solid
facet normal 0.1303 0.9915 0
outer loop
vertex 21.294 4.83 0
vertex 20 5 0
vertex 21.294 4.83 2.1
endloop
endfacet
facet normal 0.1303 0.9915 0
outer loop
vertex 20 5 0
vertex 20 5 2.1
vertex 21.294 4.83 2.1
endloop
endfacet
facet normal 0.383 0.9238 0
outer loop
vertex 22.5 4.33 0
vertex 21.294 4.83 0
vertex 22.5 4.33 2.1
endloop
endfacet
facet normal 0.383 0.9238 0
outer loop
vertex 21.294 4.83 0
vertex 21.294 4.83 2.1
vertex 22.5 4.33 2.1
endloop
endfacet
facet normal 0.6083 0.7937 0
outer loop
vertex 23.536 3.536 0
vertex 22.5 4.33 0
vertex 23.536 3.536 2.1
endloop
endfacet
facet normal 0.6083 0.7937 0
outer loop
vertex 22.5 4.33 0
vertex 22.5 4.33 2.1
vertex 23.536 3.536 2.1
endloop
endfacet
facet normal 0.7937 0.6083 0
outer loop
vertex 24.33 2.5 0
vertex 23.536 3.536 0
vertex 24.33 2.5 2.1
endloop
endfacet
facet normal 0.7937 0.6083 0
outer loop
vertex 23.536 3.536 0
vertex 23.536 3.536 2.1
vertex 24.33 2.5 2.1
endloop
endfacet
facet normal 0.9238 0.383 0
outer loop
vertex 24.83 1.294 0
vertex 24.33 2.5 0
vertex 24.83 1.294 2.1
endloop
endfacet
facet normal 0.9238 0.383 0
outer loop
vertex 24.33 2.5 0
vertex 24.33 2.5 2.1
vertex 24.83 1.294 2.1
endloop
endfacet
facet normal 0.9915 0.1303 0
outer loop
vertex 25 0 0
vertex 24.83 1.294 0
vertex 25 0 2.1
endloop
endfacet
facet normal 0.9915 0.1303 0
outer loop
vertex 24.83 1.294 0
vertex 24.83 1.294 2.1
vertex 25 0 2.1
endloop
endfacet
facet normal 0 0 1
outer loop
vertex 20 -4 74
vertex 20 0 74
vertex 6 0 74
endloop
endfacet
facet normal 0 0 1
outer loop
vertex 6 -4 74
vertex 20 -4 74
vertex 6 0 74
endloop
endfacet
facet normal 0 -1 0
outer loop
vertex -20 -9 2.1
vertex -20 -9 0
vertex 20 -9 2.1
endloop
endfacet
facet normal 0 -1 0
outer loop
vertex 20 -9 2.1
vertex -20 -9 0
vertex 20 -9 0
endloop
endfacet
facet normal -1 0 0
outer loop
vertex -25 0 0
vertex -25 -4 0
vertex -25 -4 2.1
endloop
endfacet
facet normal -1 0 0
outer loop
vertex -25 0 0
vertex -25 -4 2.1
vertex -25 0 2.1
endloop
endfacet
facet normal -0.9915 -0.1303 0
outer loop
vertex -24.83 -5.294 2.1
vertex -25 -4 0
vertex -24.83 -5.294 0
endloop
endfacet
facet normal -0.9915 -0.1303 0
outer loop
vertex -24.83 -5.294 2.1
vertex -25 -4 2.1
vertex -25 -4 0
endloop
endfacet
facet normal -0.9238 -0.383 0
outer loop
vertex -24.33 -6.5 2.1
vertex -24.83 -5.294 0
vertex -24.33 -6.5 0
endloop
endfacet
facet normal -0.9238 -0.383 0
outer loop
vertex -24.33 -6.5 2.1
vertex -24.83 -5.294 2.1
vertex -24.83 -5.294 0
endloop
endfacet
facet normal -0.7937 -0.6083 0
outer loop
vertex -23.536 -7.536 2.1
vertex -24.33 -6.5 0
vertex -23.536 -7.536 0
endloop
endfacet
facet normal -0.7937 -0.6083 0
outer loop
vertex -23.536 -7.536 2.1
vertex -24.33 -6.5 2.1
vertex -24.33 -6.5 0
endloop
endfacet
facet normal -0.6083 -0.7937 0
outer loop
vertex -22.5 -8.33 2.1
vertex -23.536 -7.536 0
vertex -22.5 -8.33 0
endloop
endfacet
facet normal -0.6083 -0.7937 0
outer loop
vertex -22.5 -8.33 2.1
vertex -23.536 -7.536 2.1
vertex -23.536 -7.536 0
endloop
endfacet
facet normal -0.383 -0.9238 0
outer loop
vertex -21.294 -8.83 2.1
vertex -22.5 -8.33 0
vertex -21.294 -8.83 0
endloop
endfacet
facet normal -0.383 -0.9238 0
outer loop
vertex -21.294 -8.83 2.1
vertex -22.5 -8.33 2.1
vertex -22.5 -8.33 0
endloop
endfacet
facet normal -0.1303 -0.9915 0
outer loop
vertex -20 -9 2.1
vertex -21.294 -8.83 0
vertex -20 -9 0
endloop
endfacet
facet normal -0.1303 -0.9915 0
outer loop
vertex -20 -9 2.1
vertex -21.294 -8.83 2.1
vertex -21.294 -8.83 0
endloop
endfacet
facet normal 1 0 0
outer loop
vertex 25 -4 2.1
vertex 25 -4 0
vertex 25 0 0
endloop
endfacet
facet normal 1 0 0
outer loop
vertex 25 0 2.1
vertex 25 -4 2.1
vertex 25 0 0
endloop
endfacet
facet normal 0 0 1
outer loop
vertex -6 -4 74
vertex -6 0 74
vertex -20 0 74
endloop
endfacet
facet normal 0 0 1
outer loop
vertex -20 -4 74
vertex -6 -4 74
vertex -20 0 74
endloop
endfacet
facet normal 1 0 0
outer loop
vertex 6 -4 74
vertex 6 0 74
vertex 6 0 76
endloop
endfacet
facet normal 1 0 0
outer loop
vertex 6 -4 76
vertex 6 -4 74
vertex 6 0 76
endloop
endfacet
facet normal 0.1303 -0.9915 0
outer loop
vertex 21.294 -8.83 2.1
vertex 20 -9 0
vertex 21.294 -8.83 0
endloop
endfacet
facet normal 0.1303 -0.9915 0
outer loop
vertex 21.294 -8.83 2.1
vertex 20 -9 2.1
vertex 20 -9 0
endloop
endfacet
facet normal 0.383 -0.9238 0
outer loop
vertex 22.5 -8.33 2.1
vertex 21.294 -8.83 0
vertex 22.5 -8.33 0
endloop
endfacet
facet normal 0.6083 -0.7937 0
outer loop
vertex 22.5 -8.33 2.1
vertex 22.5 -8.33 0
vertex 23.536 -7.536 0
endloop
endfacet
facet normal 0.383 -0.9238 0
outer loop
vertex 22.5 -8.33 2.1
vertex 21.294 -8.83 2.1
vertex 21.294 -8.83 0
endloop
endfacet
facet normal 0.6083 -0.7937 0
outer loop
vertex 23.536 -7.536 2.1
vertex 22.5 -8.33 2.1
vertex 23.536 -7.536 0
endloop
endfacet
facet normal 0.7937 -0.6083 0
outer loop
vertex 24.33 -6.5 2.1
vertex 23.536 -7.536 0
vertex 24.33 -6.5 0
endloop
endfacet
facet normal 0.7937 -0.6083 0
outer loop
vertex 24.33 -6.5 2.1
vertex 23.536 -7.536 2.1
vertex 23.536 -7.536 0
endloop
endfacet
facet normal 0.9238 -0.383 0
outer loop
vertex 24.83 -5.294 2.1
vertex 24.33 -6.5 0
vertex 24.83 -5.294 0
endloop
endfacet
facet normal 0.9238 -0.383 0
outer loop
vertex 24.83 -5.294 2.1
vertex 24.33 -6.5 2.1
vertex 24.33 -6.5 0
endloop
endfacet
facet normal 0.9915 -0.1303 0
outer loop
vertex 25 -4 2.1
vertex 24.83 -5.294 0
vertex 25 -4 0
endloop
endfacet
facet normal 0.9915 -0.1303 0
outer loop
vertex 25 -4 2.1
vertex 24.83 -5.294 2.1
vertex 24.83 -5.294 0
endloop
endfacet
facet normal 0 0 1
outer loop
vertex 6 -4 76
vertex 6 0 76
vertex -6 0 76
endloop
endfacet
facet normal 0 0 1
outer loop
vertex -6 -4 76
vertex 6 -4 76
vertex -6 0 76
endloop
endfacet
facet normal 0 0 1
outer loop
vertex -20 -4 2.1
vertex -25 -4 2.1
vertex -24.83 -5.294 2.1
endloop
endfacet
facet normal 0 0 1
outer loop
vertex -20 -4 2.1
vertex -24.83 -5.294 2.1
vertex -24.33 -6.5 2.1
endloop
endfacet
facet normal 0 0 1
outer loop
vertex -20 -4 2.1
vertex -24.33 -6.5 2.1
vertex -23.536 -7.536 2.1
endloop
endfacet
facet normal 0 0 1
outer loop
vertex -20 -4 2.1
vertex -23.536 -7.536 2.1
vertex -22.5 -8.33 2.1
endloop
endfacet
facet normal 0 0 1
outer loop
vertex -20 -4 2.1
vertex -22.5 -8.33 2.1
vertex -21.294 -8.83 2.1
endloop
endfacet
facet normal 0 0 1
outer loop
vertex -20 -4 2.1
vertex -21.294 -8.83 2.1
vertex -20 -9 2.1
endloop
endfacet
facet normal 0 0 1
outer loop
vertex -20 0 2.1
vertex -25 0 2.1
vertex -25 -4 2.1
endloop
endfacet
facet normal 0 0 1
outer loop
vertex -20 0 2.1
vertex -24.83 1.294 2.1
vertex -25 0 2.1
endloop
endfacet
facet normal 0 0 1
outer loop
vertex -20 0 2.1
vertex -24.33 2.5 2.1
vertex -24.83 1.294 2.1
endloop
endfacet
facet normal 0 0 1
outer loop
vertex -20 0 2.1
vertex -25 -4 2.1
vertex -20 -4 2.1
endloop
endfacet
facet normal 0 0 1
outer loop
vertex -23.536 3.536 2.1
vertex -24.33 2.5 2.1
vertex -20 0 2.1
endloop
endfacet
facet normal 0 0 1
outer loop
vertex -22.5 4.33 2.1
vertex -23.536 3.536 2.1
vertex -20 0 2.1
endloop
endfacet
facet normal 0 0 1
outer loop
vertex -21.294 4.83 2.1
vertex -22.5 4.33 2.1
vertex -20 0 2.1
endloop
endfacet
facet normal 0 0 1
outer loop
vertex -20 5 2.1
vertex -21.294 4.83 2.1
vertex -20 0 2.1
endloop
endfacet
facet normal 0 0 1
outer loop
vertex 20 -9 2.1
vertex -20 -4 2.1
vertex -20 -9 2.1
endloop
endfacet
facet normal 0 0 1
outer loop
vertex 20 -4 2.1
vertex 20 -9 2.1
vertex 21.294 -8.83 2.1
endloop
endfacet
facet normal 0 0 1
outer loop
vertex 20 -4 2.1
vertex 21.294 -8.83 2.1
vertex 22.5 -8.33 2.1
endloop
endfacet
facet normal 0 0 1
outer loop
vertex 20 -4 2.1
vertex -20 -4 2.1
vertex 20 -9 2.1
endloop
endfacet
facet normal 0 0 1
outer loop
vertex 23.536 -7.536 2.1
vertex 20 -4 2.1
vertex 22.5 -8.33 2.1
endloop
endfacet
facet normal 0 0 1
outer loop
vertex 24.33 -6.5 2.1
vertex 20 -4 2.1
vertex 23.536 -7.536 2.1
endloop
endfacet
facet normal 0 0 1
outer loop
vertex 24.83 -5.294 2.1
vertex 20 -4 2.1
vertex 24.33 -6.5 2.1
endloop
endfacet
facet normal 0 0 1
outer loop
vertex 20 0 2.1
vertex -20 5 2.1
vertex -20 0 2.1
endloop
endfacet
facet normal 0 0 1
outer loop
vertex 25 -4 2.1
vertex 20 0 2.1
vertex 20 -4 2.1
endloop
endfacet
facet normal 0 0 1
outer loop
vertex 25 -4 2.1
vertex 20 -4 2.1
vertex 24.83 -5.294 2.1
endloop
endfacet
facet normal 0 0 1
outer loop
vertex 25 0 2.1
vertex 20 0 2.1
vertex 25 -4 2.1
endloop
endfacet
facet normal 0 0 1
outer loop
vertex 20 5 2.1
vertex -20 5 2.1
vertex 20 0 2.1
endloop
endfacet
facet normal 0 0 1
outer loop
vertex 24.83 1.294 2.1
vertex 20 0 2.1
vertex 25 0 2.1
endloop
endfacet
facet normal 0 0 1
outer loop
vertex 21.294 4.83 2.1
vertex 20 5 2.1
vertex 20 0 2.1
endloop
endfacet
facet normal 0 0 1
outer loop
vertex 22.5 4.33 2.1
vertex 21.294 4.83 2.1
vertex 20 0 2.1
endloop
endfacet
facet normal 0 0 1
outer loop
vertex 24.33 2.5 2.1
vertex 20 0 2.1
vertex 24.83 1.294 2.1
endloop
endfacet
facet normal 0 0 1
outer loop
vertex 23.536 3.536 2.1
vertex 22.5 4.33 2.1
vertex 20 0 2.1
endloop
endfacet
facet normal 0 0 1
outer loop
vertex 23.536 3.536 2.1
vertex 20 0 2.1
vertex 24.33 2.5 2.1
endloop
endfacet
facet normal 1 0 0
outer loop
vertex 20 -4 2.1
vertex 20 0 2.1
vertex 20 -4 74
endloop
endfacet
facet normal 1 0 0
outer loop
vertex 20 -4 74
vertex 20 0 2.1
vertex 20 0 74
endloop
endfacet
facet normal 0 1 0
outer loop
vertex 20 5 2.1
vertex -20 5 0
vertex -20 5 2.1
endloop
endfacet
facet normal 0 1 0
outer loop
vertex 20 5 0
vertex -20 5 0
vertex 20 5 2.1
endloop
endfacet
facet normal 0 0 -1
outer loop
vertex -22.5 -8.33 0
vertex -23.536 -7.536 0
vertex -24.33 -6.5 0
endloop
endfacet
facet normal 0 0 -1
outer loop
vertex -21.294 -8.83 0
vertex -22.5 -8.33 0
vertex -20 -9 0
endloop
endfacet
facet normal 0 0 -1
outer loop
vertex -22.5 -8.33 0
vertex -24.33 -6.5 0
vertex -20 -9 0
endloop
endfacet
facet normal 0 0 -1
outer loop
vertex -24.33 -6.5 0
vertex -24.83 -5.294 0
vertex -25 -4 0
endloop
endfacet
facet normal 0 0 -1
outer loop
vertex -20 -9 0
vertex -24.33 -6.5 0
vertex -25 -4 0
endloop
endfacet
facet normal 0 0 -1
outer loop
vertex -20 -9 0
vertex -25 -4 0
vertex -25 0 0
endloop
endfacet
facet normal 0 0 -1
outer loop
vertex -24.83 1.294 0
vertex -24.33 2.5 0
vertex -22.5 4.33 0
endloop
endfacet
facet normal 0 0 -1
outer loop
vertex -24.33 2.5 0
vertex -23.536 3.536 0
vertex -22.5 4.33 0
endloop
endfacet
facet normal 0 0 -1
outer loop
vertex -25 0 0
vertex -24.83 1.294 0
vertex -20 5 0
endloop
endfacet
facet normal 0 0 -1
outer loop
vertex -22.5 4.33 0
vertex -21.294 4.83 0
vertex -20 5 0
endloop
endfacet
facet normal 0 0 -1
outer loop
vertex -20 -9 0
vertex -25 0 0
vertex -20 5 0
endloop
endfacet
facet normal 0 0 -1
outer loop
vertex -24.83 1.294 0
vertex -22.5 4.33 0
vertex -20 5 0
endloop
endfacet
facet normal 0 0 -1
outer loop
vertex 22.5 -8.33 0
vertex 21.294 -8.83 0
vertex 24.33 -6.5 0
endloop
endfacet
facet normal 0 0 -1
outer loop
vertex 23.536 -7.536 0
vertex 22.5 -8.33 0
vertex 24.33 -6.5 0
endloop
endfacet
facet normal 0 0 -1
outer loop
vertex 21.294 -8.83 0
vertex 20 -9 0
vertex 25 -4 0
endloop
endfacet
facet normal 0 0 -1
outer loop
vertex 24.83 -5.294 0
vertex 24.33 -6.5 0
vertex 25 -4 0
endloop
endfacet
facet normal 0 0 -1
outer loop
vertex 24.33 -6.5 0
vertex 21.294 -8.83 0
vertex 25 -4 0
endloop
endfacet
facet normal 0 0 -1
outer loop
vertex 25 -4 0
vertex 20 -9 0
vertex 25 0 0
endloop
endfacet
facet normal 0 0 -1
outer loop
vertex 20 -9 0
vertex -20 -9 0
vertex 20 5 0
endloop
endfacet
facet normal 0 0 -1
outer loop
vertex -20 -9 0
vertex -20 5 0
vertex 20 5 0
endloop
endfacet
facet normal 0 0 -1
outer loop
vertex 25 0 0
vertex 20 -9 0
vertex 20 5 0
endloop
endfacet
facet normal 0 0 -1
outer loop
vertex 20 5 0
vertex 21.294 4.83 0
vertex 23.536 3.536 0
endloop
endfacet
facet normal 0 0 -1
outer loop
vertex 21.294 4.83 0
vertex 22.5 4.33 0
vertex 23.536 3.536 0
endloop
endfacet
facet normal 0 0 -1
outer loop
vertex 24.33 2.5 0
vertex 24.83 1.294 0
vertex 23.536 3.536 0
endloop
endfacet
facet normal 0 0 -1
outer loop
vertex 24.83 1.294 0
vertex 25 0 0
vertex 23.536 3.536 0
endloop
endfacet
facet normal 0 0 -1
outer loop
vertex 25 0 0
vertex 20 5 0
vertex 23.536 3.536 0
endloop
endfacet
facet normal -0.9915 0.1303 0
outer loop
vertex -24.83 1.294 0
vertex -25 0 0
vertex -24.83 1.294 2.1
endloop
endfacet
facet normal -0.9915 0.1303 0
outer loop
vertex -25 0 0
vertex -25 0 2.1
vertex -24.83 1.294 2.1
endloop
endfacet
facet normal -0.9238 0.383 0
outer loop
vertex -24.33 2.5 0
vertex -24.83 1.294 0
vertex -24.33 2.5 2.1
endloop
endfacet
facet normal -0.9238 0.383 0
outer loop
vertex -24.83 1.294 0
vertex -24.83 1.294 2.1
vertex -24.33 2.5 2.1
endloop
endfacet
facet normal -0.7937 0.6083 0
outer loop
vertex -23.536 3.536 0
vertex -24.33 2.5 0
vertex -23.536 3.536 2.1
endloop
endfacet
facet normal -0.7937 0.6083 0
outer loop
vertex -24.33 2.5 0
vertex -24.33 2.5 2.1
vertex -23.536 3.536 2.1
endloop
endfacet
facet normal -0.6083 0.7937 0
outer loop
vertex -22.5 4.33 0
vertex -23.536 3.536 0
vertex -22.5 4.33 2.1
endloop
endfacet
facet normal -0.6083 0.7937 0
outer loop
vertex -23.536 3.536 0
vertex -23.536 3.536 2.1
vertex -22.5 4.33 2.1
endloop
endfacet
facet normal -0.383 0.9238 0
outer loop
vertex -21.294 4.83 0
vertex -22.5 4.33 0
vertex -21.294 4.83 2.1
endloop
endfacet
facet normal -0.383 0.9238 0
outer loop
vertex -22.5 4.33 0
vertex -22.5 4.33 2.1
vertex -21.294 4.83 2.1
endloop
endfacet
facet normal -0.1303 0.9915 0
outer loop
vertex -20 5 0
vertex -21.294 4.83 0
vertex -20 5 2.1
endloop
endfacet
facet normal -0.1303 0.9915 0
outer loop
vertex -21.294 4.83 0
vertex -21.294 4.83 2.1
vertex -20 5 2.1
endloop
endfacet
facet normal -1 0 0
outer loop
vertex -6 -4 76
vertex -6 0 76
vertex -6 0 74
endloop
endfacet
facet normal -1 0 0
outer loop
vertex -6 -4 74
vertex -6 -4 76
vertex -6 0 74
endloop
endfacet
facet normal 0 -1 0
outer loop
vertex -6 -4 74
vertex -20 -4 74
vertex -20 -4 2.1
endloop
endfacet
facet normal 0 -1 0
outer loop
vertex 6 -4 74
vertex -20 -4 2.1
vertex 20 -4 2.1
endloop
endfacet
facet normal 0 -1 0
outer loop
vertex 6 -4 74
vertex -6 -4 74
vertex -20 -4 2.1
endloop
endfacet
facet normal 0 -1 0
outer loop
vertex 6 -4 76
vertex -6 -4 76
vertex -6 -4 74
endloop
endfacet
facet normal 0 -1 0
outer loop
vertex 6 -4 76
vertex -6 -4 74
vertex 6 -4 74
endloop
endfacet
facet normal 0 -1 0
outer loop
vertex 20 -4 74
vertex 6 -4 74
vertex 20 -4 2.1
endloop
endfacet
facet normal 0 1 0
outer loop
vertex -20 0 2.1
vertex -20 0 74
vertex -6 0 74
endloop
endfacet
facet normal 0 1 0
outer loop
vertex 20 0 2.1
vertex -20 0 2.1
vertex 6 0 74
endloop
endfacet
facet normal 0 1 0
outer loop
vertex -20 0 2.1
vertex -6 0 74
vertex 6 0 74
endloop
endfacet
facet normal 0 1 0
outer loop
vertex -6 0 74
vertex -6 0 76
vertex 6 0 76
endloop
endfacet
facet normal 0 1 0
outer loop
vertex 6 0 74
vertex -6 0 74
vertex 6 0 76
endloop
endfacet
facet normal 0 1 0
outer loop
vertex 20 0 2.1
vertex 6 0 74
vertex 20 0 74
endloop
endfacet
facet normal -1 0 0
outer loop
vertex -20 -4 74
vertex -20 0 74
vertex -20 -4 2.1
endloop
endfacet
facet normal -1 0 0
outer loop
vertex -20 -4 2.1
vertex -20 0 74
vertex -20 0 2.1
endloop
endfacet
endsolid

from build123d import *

# Parameters (mm, degrees)
F2_DEPTH = 4
F3_W     = 50
F3_H     = 14
F4_DEPTH = 2.1
F5_R     = 5


with BuildPart() as f2:
    # F1 (on Front) → F2 (new body)
    with BuildSketch(Plane.XZ):
        Polygon((-20, 0), (20, 0), (20, 74), (6, 74), (6, 76), (-6, 76), (-6, 74), (-20, 74), align=None)
    extrude(amount=F2_DEPTH)

    # F3 (on Top) → F4 (join)
    with BuildSketch(Plane.XY):
        with Locations((0, -2)):
            Rectangle(F3_W, F3_H)
    extrude(amount=F4_DEPTH)

    # F5
    f5_edges = [f2.edges().sort_by_distance(p)[0] for p in [
        (-25, -9, 1.05),
        (25, -9, 1.05),
        (25, 5, 1.05),
        (-25, 5, 1.05),
    ]]
    fillet(f5_edges, radius=F5_R)


solid = f2.part
